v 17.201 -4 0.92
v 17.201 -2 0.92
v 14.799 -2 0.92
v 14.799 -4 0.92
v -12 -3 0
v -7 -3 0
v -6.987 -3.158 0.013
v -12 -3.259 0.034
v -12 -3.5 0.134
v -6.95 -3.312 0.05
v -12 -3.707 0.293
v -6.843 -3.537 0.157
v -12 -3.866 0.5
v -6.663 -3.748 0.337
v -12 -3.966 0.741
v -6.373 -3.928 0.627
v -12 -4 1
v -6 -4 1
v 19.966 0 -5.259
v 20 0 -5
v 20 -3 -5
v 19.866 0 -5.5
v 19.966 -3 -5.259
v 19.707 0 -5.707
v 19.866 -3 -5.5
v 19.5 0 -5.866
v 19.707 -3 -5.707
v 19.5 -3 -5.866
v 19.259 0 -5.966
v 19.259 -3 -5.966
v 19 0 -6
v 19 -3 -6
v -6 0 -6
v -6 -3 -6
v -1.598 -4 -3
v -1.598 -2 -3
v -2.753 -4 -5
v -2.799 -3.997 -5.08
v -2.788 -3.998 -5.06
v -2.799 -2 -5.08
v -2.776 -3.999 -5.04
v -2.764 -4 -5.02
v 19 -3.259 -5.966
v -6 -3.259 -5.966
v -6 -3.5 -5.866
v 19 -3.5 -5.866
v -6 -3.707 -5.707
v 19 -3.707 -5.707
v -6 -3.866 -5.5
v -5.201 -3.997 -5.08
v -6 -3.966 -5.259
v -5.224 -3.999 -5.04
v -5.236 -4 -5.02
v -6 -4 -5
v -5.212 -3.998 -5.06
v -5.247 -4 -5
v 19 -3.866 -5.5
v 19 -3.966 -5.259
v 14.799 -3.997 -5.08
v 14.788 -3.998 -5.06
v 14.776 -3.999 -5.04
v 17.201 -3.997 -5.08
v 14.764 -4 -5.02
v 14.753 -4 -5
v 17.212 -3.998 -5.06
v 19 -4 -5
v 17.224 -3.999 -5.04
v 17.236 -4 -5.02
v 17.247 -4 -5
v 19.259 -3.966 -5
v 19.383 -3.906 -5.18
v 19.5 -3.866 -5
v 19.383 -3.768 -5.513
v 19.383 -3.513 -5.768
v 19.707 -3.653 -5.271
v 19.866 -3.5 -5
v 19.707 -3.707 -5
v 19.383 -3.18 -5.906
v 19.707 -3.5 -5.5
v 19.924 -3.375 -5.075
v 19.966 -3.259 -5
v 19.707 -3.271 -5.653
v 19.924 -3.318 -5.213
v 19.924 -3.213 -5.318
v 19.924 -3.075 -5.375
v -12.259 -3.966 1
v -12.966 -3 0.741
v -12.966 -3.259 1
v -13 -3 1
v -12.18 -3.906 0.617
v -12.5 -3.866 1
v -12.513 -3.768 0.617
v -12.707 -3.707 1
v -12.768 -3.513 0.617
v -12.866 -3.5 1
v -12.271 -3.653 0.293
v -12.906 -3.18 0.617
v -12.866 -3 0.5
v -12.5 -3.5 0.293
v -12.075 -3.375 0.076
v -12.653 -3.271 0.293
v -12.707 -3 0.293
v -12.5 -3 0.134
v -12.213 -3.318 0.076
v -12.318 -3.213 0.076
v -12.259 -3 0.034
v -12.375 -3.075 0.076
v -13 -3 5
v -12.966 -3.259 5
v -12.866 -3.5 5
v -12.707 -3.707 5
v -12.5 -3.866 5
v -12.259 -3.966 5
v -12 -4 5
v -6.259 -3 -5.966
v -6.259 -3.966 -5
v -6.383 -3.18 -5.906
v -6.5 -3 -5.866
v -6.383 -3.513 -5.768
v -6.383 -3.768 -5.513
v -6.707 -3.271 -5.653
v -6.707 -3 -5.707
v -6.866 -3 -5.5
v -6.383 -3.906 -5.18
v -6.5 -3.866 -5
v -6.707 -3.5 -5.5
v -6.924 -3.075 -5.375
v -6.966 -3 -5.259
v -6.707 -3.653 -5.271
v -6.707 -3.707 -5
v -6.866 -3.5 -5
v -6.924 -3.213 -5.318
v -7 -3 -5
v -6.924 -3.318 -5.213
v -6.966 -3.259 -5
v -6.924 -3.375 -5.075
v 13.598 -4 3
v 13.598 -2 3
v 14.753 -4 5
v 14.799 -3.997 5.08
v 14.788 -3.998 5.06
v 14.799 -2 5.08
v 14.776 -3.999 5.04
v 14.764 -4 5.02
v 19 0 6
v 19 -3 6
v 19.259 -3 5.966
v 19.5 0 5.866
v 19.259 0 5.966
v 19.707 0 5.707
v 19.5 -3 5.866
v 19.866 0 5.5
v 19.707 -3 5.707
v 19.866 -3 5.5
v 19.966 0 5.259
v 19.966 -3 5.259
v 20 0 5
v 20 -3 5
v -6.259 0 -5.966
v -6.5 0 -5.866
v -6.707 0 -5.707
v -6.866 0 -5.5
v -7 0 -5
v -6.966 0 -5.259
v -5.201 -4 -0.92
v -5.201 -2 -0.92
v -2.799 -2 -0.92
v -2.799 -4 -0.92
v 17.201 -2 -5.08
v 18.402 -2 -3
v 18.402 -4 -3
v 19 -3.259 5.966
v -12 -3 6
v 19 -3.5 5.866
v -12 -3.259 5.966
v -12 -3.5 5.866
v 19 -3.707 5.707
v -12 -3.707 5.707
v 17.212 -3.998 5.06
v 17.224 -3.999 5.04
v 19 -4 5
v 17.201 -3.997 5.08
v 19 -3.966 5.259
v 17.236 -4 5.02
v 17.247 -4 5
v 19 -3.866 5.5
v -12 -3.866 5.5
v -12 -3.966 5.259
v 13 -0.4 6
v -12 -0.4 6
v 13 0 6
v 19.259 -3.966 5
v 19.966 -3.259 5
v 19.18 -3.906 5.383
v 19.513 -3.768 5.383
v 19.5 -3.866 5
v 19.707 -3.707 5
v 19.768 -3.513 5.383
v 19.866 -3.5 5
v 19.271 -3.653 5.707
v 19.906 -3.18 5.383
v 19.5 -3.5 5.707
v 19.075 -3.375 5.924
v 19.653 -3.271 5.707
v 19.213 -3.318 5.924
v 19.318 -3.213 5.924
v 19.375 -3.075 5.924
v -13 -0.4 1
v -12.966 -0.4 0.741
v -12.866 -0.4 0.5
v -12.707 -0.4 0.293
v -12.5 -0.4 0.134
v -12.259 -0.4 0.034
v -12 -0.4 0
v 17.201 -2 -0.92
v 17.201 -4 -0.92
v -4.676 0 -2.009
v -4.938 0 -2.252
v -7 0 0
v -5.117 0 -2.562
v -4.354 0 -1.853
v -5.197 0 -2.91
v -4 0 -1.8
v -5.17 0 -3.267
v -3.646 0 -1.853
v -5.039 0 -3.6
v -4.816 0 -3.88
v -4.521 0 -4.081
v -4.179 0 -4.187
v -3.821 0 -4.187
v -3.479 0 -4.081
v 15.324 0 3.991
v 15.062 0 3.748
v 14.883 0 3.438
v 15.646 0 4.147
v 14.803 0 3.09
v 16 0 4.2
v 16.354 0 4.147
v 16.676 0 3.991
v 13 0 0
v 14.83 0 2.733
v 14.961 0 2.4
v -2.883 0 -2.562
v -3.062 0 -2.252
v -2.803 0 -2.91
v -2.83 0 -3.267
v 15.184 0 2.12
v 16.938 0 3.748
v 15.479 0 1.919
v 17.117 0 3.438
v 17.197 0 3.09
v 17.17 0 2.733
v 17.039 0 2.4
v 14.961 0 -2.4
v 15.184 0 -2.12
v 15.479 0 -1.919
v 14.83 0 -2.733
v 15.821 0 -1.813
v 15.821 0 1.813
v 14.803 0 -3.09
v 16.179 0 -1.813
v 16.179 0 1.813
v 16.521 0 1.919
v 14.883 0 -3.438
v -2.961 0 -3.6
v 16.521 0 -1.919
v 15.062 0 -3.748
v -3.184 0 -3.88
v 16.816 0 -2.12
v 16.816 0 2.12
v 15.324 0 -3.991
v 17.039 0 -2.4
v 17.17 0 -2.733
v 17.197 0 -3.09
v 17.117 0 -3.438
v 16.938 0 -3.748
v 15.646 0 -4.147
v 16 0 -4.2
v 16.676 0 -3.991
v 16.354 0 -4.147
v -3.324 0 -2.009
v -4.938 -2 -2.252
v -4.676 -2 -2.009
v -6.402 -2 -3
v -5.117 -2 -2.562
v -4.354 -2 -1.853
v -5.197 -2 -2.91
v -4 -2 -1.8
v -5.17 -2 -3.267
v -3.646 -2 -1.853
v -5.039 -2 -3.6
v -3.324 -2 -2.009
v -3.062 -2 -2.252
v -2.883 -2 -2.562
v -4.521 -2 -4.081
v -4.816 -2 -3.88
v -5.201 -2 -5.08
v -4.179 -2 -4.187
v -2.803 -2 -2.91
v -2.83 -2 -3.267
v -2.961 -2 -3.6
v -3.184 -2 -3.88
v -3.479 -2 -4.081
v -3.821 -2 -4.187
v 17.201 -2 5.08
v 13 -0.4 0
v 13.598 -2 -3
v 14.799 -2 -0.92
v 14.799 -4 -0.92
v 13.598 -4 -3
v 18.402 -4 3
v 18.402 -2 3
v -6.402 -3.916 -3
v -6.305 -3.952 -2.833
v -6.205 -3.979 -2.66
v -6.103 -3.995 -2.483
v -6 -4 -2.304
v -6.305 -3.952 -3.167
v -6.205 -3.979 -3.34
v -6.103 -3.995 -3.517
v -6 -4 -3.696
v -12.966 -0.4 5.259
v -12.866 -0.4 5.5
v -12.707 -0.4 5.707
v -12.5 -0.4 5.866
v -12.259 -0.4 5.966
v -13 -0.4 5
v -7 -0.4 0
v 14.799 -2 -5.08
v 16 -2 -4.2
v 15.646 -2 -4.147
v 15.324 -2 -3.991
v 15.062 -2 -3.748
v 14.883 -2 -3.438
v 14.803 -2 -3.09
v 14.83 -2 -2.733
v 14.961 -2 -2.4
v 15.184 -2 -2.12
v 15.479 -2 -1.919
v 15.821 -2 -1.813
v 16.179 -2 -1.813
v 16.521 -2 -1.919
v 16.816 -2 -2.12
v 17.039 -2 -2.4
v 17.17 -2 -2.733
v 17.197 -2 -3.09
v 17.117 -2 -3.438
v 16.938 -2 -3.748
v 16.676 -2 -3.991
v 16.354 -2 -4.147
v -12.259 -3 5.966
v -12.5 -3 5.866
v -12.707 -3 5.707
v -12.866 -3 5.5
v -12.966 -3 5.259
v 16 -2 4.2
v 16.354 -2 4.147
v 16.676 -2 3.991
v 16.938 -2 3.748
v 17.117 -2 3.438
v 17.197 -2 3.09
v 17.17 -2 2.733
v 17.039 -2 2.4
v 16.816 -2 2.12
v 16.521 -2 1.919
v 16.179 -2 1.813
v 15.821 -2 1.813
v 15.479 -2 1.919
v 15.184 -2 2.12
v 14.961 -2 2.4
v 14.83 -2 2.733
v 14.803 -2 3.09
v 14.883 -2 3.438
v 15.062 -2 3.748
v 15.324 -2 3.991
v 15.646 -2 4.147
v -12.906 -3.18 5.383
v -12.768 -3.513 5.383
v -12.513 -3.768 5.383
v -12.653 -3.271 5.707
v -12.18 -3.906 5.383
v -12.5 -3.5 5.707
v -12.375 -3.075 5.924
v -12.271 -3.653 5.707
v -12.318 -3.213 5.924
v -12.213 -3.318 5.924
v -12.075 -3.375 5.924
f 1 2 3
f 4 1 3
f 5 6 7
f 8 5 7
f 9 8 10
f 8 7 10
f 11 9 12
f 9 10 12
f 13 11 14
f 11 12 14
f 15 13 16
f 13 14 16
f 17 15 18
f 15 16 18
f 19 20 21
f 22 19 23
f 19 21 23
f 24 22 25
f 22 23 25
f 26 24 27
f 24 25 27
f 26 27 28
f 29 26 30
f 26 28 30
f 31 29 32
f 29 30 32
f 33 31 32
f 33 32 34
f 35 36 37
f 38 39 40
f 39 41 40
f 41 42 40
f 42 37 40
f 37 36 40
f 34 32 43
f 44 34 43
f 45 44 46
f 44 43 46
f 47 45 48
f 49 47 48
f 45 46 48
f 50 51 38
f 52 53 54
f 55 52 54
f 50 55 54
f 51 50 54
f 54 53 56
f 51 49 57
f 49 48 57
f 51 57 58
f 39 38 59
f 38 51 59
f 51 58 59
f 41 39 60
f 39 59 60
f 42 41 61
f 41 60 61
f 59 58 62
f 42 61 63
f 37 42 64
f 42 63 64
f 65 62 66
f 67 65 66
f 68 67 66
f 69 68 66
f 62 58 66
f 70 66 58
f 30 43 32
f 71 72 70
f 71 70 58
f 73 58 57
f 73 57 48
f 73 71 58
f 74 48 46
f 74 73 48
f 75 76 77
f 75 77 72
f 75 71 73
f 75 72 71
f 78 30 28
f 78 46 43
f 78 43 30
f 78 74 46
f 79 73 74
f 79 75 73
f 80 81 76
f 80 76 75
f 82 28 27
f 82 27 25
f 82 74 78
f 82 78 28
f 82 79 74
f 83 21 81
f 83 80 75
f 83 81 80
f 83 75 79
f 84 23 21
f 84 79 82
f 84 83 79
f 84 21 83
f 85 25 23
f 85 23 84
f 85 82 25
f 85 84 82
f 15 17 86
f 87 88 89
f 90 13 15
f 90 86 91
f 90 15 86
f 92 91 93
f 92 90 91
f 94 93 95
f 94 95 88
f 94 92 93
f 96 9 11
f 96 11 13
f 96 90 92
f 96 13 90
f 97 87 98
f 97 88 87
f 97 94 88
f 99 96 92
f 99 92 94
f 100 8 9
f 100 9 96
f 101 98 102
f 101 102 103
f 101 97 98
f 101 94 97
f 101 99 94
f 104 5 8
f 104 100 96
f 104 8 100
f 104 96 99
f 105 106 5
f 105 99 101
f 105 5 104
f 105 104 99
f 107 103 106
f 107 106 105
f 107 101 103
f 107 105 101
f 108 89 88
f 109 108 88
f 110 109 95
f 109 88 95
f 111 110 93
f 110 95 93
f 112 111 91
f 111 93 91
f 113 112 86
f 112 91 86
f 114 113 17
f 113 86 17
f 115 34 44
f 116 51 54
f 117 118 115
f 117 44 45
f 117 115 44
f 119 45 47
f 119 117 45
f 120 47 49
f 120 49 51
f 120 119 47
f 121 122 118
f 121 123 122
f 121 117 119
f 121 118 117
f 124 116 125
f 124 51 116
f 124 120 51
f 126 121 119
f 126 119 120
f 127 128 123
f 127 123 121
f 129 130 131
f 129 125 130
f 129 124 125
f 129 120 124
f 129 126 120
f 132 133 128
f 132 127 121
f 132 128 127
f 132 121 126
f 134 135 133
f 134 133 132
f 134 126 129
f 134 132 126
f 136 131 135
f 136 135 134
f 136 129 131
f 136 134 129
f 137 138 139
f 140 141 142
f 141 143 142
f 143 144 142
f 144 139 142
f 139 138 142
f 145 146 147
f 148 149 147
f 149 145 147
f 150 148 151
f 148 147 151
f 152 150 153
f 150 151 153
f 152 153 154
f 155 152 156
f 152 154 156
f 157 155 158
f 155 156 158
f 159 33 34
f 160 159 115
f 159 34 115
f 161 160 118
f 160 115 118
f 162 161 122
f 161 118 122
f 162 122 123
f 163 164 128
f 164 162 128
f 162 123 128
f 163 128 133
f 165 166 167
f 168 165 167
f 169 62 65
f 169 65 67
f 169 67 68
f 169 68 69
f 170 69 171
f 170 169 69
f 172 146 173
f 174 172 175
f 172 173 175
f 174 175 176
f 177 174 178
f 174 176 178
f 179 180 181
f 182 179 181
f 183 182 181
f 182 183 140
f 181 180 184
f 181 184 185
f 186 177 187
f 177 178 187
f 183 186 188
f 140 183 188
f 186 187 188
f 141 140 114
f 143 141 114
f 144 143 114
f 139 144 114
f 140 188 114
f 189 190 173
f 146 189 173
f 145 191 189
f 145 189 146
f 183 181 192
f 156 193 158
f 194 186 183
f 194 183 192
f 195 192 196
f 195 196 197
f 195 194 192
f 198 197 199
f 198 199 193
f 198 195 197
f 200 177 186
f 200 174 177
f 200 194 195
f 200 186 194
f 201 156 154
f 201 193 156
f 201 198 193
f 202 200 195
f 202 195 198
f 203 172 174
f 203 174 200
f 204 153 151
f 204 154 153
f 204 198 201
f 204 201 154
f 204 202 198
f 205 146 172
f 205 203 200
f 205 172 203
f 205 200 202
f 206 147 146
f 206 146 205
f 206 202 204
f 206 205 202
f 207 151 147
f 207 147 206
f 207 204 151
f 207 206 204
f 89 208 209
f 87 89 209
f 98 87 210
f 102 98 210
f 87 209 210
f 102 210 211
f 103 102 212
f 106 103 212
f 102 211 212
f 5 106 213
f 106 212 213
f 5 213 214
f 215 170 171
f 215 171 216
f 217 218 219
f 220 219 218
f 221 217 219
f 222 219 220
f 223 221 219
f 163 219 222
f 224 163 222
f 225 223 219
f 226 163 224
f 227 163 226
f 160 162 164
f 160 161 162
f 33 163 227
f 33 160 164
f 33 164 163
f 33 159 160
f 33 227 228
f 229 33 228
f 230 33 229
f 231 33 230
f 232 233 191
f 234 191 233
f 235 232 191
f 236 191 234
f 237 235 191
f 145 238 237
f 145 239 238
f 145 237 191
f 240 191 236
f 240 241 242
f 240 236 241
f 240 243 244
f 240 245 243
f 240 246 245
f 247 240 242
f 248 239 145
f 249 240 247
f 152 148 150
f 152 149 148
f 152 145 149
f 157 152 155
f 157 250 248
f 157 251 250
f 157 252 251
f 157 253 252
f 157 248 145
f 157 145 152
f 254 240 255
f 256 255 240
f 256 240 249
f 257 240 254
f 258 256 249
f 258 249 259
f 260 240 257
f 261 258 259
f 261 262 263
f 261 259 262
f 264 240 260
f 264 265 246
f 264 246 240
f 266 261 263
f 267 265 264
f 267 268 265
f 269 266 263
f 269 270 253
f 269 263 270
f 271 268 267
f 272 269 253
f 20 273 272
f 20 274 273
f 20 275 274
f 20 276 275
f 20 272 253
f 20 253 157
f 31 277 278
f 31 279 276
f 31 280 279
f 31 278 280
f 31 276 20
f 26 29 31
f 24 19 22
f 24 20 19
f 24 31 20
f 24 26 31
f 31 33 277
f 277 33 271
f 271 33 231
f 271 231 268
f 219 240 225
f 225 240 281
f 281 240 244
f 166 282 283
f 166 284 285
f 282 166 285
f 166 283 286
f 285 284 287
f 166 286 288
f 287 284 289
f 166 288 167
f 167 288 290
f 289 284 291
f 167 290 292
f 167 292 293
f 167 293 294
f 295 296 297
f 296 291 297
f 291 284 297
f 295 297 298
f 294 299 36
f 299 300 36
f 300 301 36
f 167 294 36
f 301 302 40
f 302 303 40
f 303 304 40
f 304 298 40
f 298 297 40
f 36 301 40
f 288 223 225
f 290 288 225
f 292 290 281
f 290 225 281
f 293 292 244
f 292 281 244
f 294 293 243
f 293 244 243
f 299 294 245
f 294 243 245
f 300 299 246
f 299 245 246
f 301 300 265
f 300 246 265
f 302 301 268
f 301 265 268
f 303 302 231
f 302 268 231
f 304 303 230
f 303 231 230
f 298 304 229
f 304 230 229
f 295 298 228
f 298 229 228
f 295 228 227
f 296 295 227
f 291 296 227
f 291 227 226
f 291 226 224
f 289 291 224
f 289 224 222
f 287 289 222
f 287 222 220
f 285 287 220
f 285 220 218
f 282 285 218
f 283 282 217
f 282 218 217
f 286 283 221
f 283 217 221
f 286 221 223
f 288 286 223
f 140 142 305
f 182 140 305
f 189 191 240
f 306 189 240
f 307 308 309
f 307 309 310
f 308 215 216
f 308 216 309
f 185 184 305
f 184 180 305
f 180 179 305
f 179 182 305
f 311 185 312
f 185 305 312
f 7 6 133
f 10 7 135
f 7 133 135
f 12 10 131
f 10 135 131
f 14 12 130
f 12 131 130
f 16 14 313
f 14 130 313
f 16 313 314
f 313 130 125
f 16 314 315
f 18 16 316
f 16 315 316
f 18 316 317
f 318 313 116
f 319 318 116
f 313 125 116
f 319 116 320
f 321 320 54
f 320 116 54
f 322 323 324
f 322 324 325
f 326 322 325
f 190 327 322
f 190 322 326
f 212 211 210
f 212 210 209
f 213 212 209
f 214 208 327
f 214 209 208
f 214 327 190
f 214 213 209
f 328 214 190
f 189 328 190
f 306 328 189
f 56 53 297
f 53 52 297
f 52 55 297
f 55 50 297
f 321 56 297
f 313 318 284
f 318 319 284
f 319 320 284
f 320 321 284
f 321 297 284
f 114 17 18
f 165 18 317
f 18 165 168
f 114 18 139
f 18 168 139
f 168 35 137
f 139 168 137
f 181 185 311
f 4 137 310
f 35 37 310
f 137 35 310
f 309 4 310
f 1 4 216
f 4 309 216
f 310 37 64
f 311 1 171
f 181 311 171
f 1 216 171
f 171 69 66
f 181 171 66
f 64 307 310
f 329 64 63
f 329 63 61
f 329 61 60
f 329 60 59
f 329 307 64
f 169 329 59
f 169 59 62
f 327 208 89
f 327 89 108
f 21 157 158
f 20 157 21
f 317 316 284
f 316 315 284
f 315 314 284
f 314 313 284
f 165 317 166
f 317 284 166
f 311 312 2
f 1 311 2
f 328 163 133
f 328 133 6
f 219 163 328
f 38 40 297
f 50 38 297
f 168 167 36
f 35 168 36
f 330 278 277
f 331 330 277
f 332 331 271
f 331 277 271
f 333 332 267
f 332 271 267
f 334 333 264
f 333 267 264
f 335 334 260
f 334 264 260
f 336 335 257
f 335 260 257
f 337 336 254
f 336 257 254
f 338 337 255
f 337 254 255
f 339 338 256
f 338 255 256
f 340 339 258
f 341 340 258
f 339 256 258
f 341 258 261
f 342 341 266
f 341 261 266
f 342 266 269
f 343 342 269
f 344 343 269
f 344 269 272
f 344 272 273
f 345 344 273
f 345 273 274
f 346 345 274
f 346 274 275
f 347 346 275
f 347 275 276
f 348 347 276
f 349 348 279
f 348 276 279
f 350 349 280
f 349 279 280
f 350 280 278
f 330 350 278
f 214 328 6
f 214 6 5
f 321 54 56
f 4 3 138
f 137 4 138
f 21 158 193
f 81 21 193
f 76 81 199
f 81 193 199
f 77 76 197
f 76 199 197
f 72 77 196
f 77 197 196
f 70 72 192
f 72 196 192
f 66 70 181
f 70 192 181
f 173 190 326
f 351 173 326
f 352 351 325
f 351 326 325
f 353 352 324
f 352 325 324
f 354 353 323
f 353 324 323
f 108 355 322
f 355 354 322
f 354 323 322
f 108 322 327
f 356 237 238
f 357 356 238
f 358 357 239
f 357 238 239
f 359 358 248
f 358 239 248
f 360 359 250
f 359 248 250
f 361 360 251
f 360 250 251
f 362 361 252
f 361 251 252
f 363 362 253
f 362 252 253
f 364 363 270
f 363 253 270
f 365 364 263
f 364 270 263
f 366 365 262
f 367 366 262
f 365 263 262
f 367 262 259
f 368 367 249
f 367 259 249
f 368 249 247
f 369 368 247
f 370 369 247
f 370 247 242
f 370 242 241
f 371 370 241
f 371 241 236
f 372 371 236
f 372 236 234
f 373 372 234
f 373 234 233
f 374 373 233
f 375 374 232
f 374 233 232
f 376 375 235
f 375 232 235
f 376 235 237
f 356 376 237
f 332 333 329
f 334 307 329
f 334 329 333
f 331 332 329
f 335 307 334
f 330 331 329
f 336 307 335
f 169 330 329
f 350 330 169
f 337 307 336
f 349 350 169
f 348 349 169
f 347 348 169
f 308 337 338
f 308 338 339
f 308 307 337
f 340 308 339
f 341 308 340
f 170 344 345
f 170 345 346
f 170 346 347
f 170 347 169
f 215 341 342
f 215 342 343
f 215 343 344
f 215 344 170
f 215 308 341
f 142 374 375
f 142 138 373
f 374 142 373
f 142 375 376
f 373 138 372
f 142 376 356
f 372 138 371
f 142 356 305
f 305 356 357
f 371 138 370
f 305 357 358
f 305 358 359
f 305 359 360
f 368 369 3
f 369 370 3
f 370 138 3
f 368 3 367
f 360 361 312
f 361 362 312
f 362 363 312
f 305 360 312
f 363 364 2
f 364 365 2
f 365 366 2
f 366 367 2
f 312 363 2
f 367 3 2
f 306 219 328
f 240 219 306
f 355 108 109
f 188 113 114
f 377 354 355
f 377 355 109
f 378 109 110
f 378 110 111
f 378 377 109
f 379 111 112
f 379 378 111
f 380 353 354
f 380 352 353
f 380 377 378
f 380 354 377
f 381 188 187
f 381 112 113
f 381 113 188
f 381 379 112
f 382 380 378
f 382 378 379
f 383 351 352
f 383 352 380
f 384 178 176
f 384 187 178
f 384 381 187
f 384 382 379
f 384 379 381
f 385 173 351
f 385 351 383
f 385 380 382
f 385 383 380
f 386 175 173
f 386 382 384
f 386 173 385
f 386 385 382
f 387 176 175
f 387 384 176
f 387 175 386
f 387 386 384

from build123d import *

# Parameters (mm, degrees)
EXTRUDE_1_DEPTH        = 4
CUT_EXTRUDE_START      = 2
CUT_EXTRUDE_2_DEPTH    = 2
CUT_EXTRUDE_3_DEPTH    = 2
SKETCH_4_R             = 1.2
CUT_EXTRUDE_4_DEPTH    = 22.260291625
FILLET_1_R             = 1
SKETCH_6_W             = 26
SKETCH_6_H             = 6
CUT_EXTRUDE_8_DEPTH    = 0.4
MIRROR_START           = 2
MIRROR_2_COPY_1_DEPTH  = 2
FILLET_1_OF_MIRROR_2_R = 1
SKETCH_8_W             = 60.520940054
SKETCH_8_H             = 38.044112249
CUT_EXTRUDE_10_DEPTH   = 26


with BuildPart() as part:
    # 草圖1 → 填料-伸長1 (new body)
    with BuildSketch(Plane(origin=(0, 0, 0), x_dir=(1, 0, 0), z_dir=(0, 1, 0))):
        Polygon((-13, -6), (20, -6), (20, 6), (-7, 6), (-7, 0), (-13, 0), align=None)
    extrude_1 = extrude(amount=EXTRUDE_1_DEPTH)

    # 草圖2 → 除料-伸長2 (cut)
    with BuildSketch(Plane(origin=(0, 0, 0), x_dir=(1, 0, 0), z_dir=(0, 1, 0)).offset(CUT_EXTRUDE_START)):
        Polygon((-1.59822288, 3), (-2.79911144, 5.08), (-5.20088856, 5.08), (-6.40177712, 3), (-5.20088856, 0.92), (-2.79911144, 0.92), align=None)
    cut_extrude_2 = extrude(amount=CUT_EXTRUDE_2_DEPTH, mode=Mode.SUBTRACT)

    # 草圖3 → 除料-伸長3 (cut)
    with BuildSketch(Plane(origin=(0, 0, 0), x_dir=(1, 0, 0), z_dir=(0, 1, 0)).offset(CUT_EXTRUDE_START)):
        Polygon((13.59822288, -3), (14.79911144, -5.08), (17.20088856, -5.08), (18.40177712, -3), (17.20088856, -0.92), (14.79911144, -0.92), align=None)
    cut_extrude_3 = extrude(amount=CUT_EXTRUDE_3_DEPTH, mode=Mode.SUBTRACT)

    # 草圖4 → 除料-伸長4 (cut, through all)
    with BuildSketch(Plane(origin=(0, 0, 0), x_dir=(1, 0, 0), z_dir=(0, 1, 0))):
        with Locations(Location((-4, 3, 0), (0, 0, 270))):
            Circle(SKETCH_4_R)
        with Locations(Location((16, 3, 0), (0, 0, 90))):
            Circle(SKETCH_4_R)
        with Locations(Location((16, -3, 0), (0, 0, 270))):
            Circle(SKETCH_4_R)
    cut_extrude_4 = extrude(amount=CUT_EXTRUDE_4_DEPTH, mode=Mode.SUBTRACT)

    # 圓角1
    # the kernel refuses this fillet: 1 mm, written as the material it takes off along each edge
    with BuildSketch(Plane(origin=(-6, 3, -5), x_dir=(0, 0, -1), z_dir=(0, 1, 0))) as fillet_1_piece_1_section:
        Polygon((0, 0), (FILLET_1_R, 0), (FILLET_1_R, FILLET_1_R), (0, FILLET_1_R), align=None)
    fillet_1_piece_1 = extrude(amount=FILLET_1_R, mode=Mode.PRIVATE)
    fillet_1_piece_1 = fillet_1_piece_1 - Plane(origin=(-6, 3, -5), x_dir=(0.7071067811865476, 0, 0.7071067811865474), z_dir=(0, 1, 0)) * Sphere(FILLET_1_R, mode=Mode.PRIVATE)
    add(fillet_1_piece_1, mode=Mode.SUBTRACT)
    with BuildSketch(Plane(origin=(-12, 3, 1), x_dir=(0, 1, 0), z_dir=(-1, 0, 0))) as fillet_1_piece_2_section:
        Polygon((0, 0), (FILLET_1_R, 0), (FILLET_1_R, FILLET_1_R), (0, FILLET_1_R), align=None)
    fillet_1_piece_2 = extrude(amount=FILLET_1_R, mode=Mode.PRIVATE)
    fillet_1_piece_2 = fillet_1_piece_2 - Plane(origin=(-12, 3, 1), x_dir=(0, -0.7071067811865475, 0.7071067811865475), z_dir=(-1, 0, 0)) * Sphere(FILLET_1_R, mode=Mode.PRIVATE)
    add(fillet_1_piece_2, mode=Mode.SUBTRACT)
    with BuildSketch(Plane(origin=(-12, 3, 5), x_dir=(-1, 0, 0), z_dir=(0, 0, 1))) as fillet_1_piece_3_section:
        Polygon((0, 0), (FILLET_1_R, 0), (FILLET_1_R, -FILLET_1_R), (0, -FILLET_1_R), align=None)
    fillet_1_piece_3 = extrude(amount=FILLET_1_R, mode=Mode.PRIVATE)
    fillet_1_piece_3 = fillet_1_piece_3 - Plane(origin=(-12, 3, 5), x_dir=(0.7071067811865475, -0.7071067811865475, 0), z_dir=(0, 0, 1)) * Sphere(FILLET_1_R, mode=Mode.PRIVATE)
    add(fillet_1_piece_3, mode=Mode.SUBTRACT)
    with BuildSketch(Plane(origin=(19, 3, 5), x_dir=(1, 0, 0), z_dir=(0, 0, 1))) as fillet_1_piece_4_section:
        Polygon((0, 0), (FILLET_1_R, 0), (FILLET_1_R, FILLET_1_R), (0, FILLET_1_R), align=None)
    fillet_1_piece_4 = extrude(amount=FILLET_1_R, mode=Mode.PRIVATE)
    fillet_1_piece_4 = fillet_1_piece_4 - Plane(origin=(19, 3, 5), x_dir=(-0.7071067811865475, -0.7071067811865475, 0), z_dir=(0, 0, 1)) * Sphere(FILLET_1_R, mode=Mode.PRIVATE)
    add(fillet_1_piece_4, mode=Mode.SUBTRACT)
    with BuildSketch(Plane(origin=(19, 3, -5), x_dir=(0, 1, 0), z_dir=(1, 0, 0))) as fillet_1_piece_5_section:
        Polygon((0, 0), (FILLET_1_R, 0), (FILLET_1_R, -FILLET_1_R), (0, -FILLET_1_R), align=None)
    fillet_1_piece_5 = extrude(amount=FILLET_1_R, mode=Mode.PRIVATE)
    fillet_1_piece_5 = fillet_1_piece_5 - Plane(origin=(19, 3, -5), x_dir=(0, -0.7071067811865475, 0.7071067811865475), z_dir=(1, 0, 0)) * Sphere(FILLET_1_R, mode=Mode.PRIVATE)
    add(fillet_1_piece_5, mode=Mode.SUBTRACT)
    with BuildSketch(Plane(origin=(-7, 4, -5), x_dir=(1, 0, 0), z_dir=(0, 0, 1)), Plane(origin=(-7, 4, 0), x_dir=(0, 0, 1), z_dir=(-1, 0, 0))) as fillet_1_piece_6:
        with BuildLine():
            CenterArc((FILLET_1_R, -FILLET_1_R), FILLET_1_R, 90, 90)
            Line((0, -FILLET_1_R), (0, 0))
            Line((0, 0), (FILLET_1_R, 0))
        make_face()
    extrude(amount=5, mode=Mode.SUBTRACT)
    with BuildSketch(Plane(origin=(-13, 4, 1), x_dir=(0, -1, 0), z_dir=(0, 0, 1))) as fillet_1_piece_7:
        with BuildLine():
            CenterArc((FILLET_1_R, FILLET_1_R), FILLET_1_R, 180, 90)
            Line((0, FILLET_1_R), (0, 0))
            Line((0, 0), (FILLET_1_R, 0))
        make_face()
    extrude(amount=4, mode=Mode.SUBTRACT)
    with BuildSketch(Plane(origin=(-12, 4, 6), x_dir=(0, -1, 0), z_dir=(1, 0, 0))) as fillet_1_piece_8:
        with BuildLine():
            CenterArc((FILLET_1_R, FILLET_1_R), FILLET_1_R, 180, 90)
            Line((0, FILLET_1_R), (0, 0))
            Line((0, 0), (FILLET_1_R, 0))
        make_face()
    extrude(amount=31, mode=Mode.SUBTRACT)
    with BuildSketch(Plane(origin=(20, 4, 5), x_dir=(0, -1, 0), z_dir=(0, 0, -1))) as fillet_1_piece_9:
        with BuildLine():
            CenterArc((FILLET_1_R, FILLET_1_R), FILLET_1_R, 180, 90)
            Line((0, FILLET_1_R), (0, 0))
            Line((0, 0), (FILLET_1_R, 0))
        make_face()
    extrude(amount=10, mode=Mode.SUBTRACT)
    with BuildSketch(Plane(origin=(19, 4, -6), x_dir=(0, 0, 1), z_dir=(-1, 0, 0))) as fillet_1_piece_10:
        with BuildLine():
            CenterArc((FILLET_1_R, -FILLET_1_R), FILLET_1_R, 90, 90)
            Line((0, -FILLET_1_R), (0, 0))
            Line((0, 0), (FILLET_1_R, 0))
        make_face()
    extrude(amount=25, mode=Mode.SUBTRACT)
    with BuildSketch(Plane(origin=(-13, -2.5, 0), x_dir=(0, 0, 1), z_dir=(0, 1, 0)), Plane(origin=(-13, -2.5, 6), x_dir=(1, 0, 0), z_dir=(0, 1, 0))) as fillet_1_piece_11:
        with BuildLine():
            CenterArc((FILLET_1_R, FILLET_1_R), FILLET_1_R, 180, 90)
            Line((0, FILLET_1_R), (0, 0))
            Line((0, 0), (FILLET_1_R, 0))
        make_face()
    extrude(amount=5.5, mode=Mode.SUBTRACT)
    with BuildSketch(Plane(origin=(20, -2.5, 6), x_dir=(-1, 0, 0), z_dir=(0, 1, 0)), Plane(origin=(20, -2.5, -6), x_dir=(0, 0, 1), z_dir=(0, 1, 0)), Plane(origin=(-7, -2.5, -6), x_dir=(1, 0, 0), z_dir=(0, 1, 0))) as fillet_1_piece_12:
        with BuildLine():
            CenterArc((FILLET_1_R, -FILLET_1_R), FILLET_1_R, 90, 90)
            Line((0, -FILLET_1_R), (0, 0))
            Line((0, 0), (FILLET_1_R, 0))
        make_face()
    extrude(amount=5.5, mode=Mode.SUBTRACT)
    with BuildSketch(Plane(origin=(-4.5, 4, 0), x_dir=(0, 0, 1), z_dir=(-1, 0, 0))) as fillet_1_piece_13a_section:
        with BuildLine():
            CenterArc((FILLET_1_R, -FILLET_1_R), FILLET_1_R, 90, 90)
            Line((0, -FILLET_1_R), (0, 0))
            Line((0, 0), (FILLET_1_R, 0))
        make_face()
    fillet_1_piece_13a = extrude(amount=7.5, mode=Mode.PRIVATE)
    fillet_1_piece_13a = split(fillet_1_piece_13a, bisect_by=Plane(origin=(-7, 3.773604886, 0.226395114), z_dir=(1, 0, 0)), keep=Keep.TOP, mode=Mode.PRIVATE)
    with BuildSketch(Plane(origin=(-7, 4, -5), x_dir=(1, 0, 0), z_dir=(0, 0, 1))) as fillet_1_piece_13b_section:
        with BuildLine():
            CenterArc((FILLET_1_R, -FILLET_1_R), FILLET_1_R, 90, 90)
            Line((0, -FILLET_1_R), (0, 0))
            Line((0, 0), (FILLET_1_R, 0))
        make_face()
    fillet_1_piece_13b = extrude(amount=7.5, mode=Mode.PRIVATE)
    fillet_1_piece_13b = split(fillet_1_piece_13b, bisect_by=Plane(origin=(-6.773604886, 3.773604886, 0), z_dir=(0, 0, 1)), keep=Keep.TOP, mode=Mode.PRIVATE)
    fillet_1_piece_13 = fillet_1_piece_13a & fillet_1_piece_13b
    add(fillet_1_piece_13, mode=Mode.SUBTRACT)

    # 草圖6 → 除料-伸長8 (cut)
    with BuildSketch(Plane(origin=(0, 0, 0), x_dir=(1, 0, 0), z_dir=(0, 1, 0))):
        with Locations((0, -3)):
            Rectangle(SKETCH_6_W, SKETCH_6_H)
    cut_extrude_8 = extrude(amount=CUT_EXTRUDE_8_DEPTH, mode=Mode.SUBTRACT)

    # 鏡射3: 除料-伸長3 across plane
    add(cut_extrude_3.mirror(Plane(origin=(-7, 4, 0), x_dir=(1, 0, 0), z_dir=(0, 0, 1))), mode=Mode.SUBTRACT)

    # 鏡射2: 填料-伸長1, 除料-伸長2, 除料-伸長3, 除料-伸長4, 除料-伸長8 across plane
    add(extrude_1.mirror(Plane.ZX))
    add(cut_extrude_2.mirror(Plane.ZX), mode=Mode.SUBTRACT)
    add(cut_extrude_3.mirror(Plane.ZX), mode=Mode.SUBTRACT)
    add(cut_extrude_4.mirror(Plane.ZX), mode=Mode.SUBTRACT)
    add(cut_extrude_8.mirror(Plane.ZX), mode=Mode.SUBTRACT)

    # 鏡射2 copy 1 sketch → 鏡射2 copy 1 (cut)
    with BuildSketch(Plane.XZ.offset(MIRROR_START)):
        Polygon((13.59822288, -3), (14.79911144, -5.08), (17.20088856, -5.08), (18.40177712, -3), (17.20088856, -0.92), (14.79911144, -0.92), align=None)
    extrude(amount=MIRROR_2_COPY_1_DEPTH, mode=Mode.SUBTRACT)

    # 圓角1 of 鏡射2
    # the kernel refuses this fillet: 1 mm, written as the material it takes off along each edge
    with BuildSketch(Plane(origin=(-6, -3, -5), x_dir=(0, -1, 0), z_dir=(-1, 0, 0))) as fillet_1_of_mirror_2_piece_1_section:
        Polygon((0, 0), (FILLET_1_OF_MIRROR_2_R, 0), (FILLET_1_OF_MIRROR_2_R, -FILLET_1_OF_MIRROR_2_R), (0, -FILLET_1_OF_MIRROR_2_R), align=None)
    fillet_1_of_mirror_2_piece_1 = extrude(amount=FILLET_1_OF_MIRROR_2_R, mode=Mode.PRIVATE)
    fillet_1_of_mirror_2_piece_1 = fillet_1_of_mirror_2_piece_1 - Plane(origin=(-6, -3, -5), x_dir=(0, 0.7071067811865475, 0.7071067811865475), z_dir=(-1, 0, 0)) * Sphere(FILLET_1_OF_MIRROR_2_R, mode=Mode.PRIVATE)
    add(fillet_1_of_mirror_2_piece_1, mode=Mode.SUBTRACT)
    with BuildSketch(Plane(origin=(-12, -3, 1), x_dir=(0, -1, 0), z_dir=(0, 0, -1))) as fillet_1_of_mirror_2_piece_2_section:
        Polygon((0, 0), (FILLET_1_OF_MIRROR_2_R, 0), (FILLET_1_OF_MIRROR_2_R, FILLET_1_OF_MIRROR_2_R), (0, FILLET_1_OF_MIRROR_2_R), align=None)
    fillet_1_of_mirror_2_piece_2 = extrude(amount=FILLET_1_OF_MIRROR_2_R, mode=Mode.PRIVATE)
    fillet_1_of_mirror_2_piece_2 = fillet_1_of_mirror_2_piece_2 - Plane(origin=(-12, -3, 1), x_dir=(0.7071067811865475, 0.7071067811865475, 0), z_dir=(0, 0, -1)) * Sphere(FILLET_1_OF_MIRROR_2_R, mode=Mode.PRIVATE)
    add(fillet_1_of_mirror_2_piece_2, mode=Mode.SUBTRACT)
    with BuildSketch(Plane(origin=(-12, -3, 5), x_dir=(0, -1, 0), z_dir=(0, 0, 1))) as fillet_1_of_mirror_2_piece_3_section:
        Polygon((0, 0), (FILLET_1_OF_MIRROR_2_R, 0), (FILLET_1_OF_MIRROR_2_R, -FILLET_1_OF_MIRROR_2_R), (0, -FILLET_1_OF_MIRROR_2_R), align=None)
    fillet_1_of_mirror_2_piece_3 = extrude(amount=FILLET_1_OF_MIRROR_2_R, mode=Mode.PRIVATE)
    fillet_1_of_mirror_2_piece_3 = fillet_1_of_mirror_2_piece_3 - Plane(origin=(-12, -3, 5), x_dir=(0.7071067811865475, 0.7071067811865475, 0), z_dir=(0, 0, 1)) * Sphere(FILLET_1_OF_MIRROR_2_R, mode=Mode.PRIVATE)
    add(fillet_1_of_mirror_2_piece_3, mode=Mode.SUBTRACT)
    with BuildSketch(Plane(origin=(19, -3, 5), x_dir=(1, 0, 0), z_dir=(0, 0, 1))) as fillet_1_of_mirror_2_piece_4_section:
        Polygon((0, 0), (FILLET_1_OF_MIRROR_2_R, 0), (FILLET_1_OF_MIRROR_2_R, -FILLET_1_OF_MIRROR_2_R), (0, -FILLET_1_OF_MIRROR_2_R), align=None)
    fillet_1_of_mirror_2_piece_4 = extrude(amount=FILLET_1_OF_MIRROR_2_R, mode=Mode.PRIVATE)
    fillet_1_of_mirror_2_piece_4 = fillet_1_of_mirror_2_piece_4 - Plane(origin=(19, -3, 5), x_dir=(-0.7071067811865475, 0.7071067811865475, 0), z_dir=(0, 0, 1)) * Sphere(FILLET_1_OF_MIRROR_2_R, mode=Mode.PRIVATE)
    add(fillet_1_of_mirror_2_piece_4, mode=Mode.SUBTRACT)
    with BuildSketch(Plane(origin=(19, -3, -5), x_dir=(0, -1, 0), z_dir=(1, 0, 0))) as fillet_1_of_mirror_2_piece_5_section:
        Polygon((0, 0), (FILLET_1_OF_MIRROR_2_R, 0), (FILLET_1_OF_MIRROR_2_R, FILLET_1_OF_MIRROR_2_R), (0, FILLET_1_OF_MIRROR_2_R), align=None)
    fillet_1_of_mirror_2_piece_5 = extrude(amount=FILLET_1_OF_MIRROR_2_R, mode=Mode.PRIVATE)
    fillet_1_of_mirror_2_piece_5 = fillet_1_of_mirror_2_piece_5 - Plane(origin=(19, -3, -5), x_dir=(0, 0.7071067811865475, 0.7071067811865475), z_dir=(1, 0, 0)) * Sphere(FILLET_1_OF_MIRROR_2_R, mode=Mode.PRIVATE)
    add(fillet_1_of_mirror_2_piece_5, mode=Mode.SUBTRACT)
    with BuildSketch(Plane(origin=(-7, -4, -5), x_dir=(1, 0, 0), z_dir=(0, 0, 1)), Plane(origin=(-7, -4, 0), x_dir=(0, 0, 1), z_dir=(-1, 0, 0))) as fillet_1_of_mirror_2_piece_6:
        with BuildLine():
            CenterArc((FILLET_1_OF_MIRROR_2_R, FILLET_1_OF_MIRROR_2_R), FILLET_1_OF_MIRROR_2_R, 180, 90)
            Line((0, FILLET_1_OF_MIRROR_2_R), (0, 0))
            Line((0, 0), (FILLET_1_OF_MIRROR_2_R, 0))
        make_face()
    extrude(amount=5, mode=Mode.SUBTRACT)
    with BuildSketch(Plane(origin=(-13, -4, 1), x_dir=(1, 0, 0), z_dir=(0, 0, 1))) as fillet_1_of_mirror_2_piece_7:
        with BuildLine():
            CenterArc((FILLET_1_OF_MIRROR_2_R, FILLET_1_OF_MIRROR_2_R), FILLET_1_OF_MIRROR_2_R, 180, 90)
            Line((0, FILLET_1_OF_MIRROR_2_R), (0, 0))
            Line((0, 0), (FILLET_1_OF_MIRROR_2_R, 0))
        make_face()
    extrude(amount=4, mode=Mode.SUBTRACT)
    with BuildSketch(Plane(origin=(-12, -4, 6), x_dir=(0, 1, 0), z_dir=(1, 0, 0))) as fillet_1_of_mirror_2_piece_8:
        with BuildLine():
            CenterArc((FILLET_1_OF_MIRROR_2_R, -FILLET_1_OF_MIRROR_2_R), FILLET_1_OF_MIRROR_2_R, 90, 90)
            Line((0, -FILLET_1_OF_MIRROR_2_R), (0, 0))
            Line((0, 0), (FILLET_1_OF_MIRROR_2_R, 0))
        make_face()
    extrude(amount=31, mode=Mode.SUBTRACT)
    with BuildSketch(Plane(origin=(20, -4, 5), x_dir=(0, 1, 0), z_dir=(0, 0, -1))) as fillet_1_of_mirror_2_piece_9:
        with BuildLine():
            CenterArc((FILLET_1_OF_MIRROR_2_R, -FILLET_1_OF_MIRROR_2_R), FILLET_1_OF_MIRROR_2_R, 90, 90)
            Line((0, -FILLET_1_OF_MIRROR_2_R), (0, 0))
            Line((0, 0), (FILLET_1_OF_MIRROR_2_R, 0))
        make_face()
    extrude(amount=10, mode=Mode.SUBTRACT)
    with BuildSketch(Plane(origin=(19, -4, -6), x_dir=(0, 0, 1), z_dir=(-1, 0, 0))) as fillet_1_of_mirror_2_piece_10:
        with BuildLine():
            CenterArc((FILLET_1_OF_MIRROR_2_R, FILLET_1_OF_MIRROR_2_R), FILLET_1_OF_MIRROR_2_R, 180, 90)
            Line((0, FILLET_1_OF_MIRROR_2_R), (0, 0))
            Line((0, 0), (FILLET_1_OF_MIRROR_2_R, 0))
        make_face()
    extrude(amount=25, mode=Mode.SUBTRACT)
    with BuildSketch(Plane(origin=(-13, 2.1, 0), x_dir=(0, 0, 1), z_dir=(0, -1, 0)), Plane(origin=(-13, 2.1, 6), x_dir=(1, 0, 0), z_dir=(0, -1, 0))) as fillet_1_of_mirror_2_piece_11:
        with BuildLine():
            CenterArc((FILLET_1_OF_MIRROR_2_R, -FILLET_1_OF_MIRROR_2_R), FILLET_1_OF_MIRROR_2_R, 90, 90)
            Line((0, -FILLET_1_OF_MIRROR_2_R), (0, 0))
            Line((0, 0), (FILLET_1_OF_MIRROR_2_R, 0))
        make_face()
    extrude(amount=5.1, mode=Mode.SUBTRACT)
    with BuildSketch(Plane(origin=(20, 2.5, 6), x_dir=(-1, 0, 0), z_dir=(0, -1, 0)), Plane(origin=(20, 2.5, -6), x_dir=(0, 0, 1), z_dir=(0, -1, 0)), Plane(origin=(-7, 2.5, -6), x_dir=(1, 0, 0), z_dir=(0, -1, 0))) as fillet_1_of_mirror_2_piece_12:
        with BuildLine():
            CenterArc((FILLET_1_OF_MIRROR_2_R, FILLET_1_OF_MIRROR_2_R), FILLET_1_OF_MIRROR_2_R, 180, 90)
            Line((0, FILLET_1_OF_MIRROR_2_R), (0, 0))
            Line((0, 0), (FILLET_1_OF_MIRROR_2_R, 0))
        make_face()
    extrude(amount=5.5, mode=Mode.SUBTRACT)
    with BuildSketch(Plane(origin=(-4.5, -4, 0), x_dir=(0, 0, 1), z_dir=(-1, 0, 0))) as fillet_1_of_mirror_2_piece_13a_section:
        with BuildLine():
            CenterArc((FILLET_1_OF_MIRROR_2_R, FILLET_1_OF_MIRROR_2_R), FILLET_1_OF_MIRROR_2_R, 180, 90)
            Line((0, FILLET_1_OF_MIRROR_2_R), (0, 0))
            Line((0, 0), (FILLET_1_OF_MIRROR_2_R, 0))
        make_face()
    fillet_1_of_mirror_2_piece_13a = extrude(amount=7.5, mode=Mode.PRIVATE)
    fillet_1_of_mirror_2_piece_13a = split(fillet_1_of_mirror_2_piece_13a, bisect_by=Plane(origin=(-7, -3.773604886, 0.226395114), z_dir=(1, 0, 0)), keep=Keep.TOP, mode=Mode.PRIVATE)
    with BuildSketch(Plane(origin=(-7, -4, -5), x_dir=(1, 0, 0), z_dir=(0, 0, 1))) as fillet_1_of_mirror_2_piece_13b_section:
        with BuildLine():
            CenterArc((FILLET_1_OF_MIRROR_2_R, FILLET_1_OF_MIRROR_2_R), FILLET_1_OF_MIRROR_2_R, 180, 90)
            Line((0, FILLET_1_OF_MIRROR_2_R), (0, 0))
            Line((0, 0), (FILLET_1_OF_MIRROR_2_R, 0))
        make_face()
    fillet_1_of_mirror_2_piece_13b = extrude(amount=7.5, mode=Mode.PRIVATE)
    fillet_1_of_mirror_2_piece_13b = split(fillet_1_of_mirror_2_piece_13b, bisect_by=Plane(origin=(-6.773604886, -3.773604886, 0), z_dir=(0, 0, 1)), keep=Keep.TOP, mode=Mode.PRIVATE)
    fillet_1_of_mirror_2_piece_13 = fillet_1_of_mirror_2_piece_13a & fillet_1_of_mirror_2_piece_13b
    add(fillet_1_of_mirror_2_piece_13, mode=Mode.SUBTRACT)

    # 草圖8 → 除料-伸長10 (cut)
    with BuildSketch(Plane(origin=(0, 0, 0), x_dir=(1, 0, 0), z_dir=(0, 1, 0))):
        with Locations((-0.399313798, 3.851597451)):
            Rectangle(SKETCH_8_W, SKETCH_8_H)
    extrude(amount=CUT_EXTRUDE_10_DEPTH, mode=Mode.SUBTRACT)


solid = part.part
